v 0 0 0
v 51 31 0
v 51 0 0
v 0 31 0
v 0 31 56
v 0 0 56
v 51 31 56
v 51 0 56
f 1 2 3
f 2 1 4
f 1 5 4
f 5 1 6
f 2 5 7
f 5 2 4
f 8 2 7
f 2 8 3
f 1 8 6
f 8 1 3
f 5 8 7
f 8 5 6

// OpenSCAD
// pisa

x=50;
y=30;
z=55;

bleed=.5;
walls=4;
var=walls*.75;

module blokk(size, bleed) {
    x = size[0];
    y = size[1];
    
    for (z = [0:size[2]]) {
        translate([0,0,z])
            linear_extrude(1)
                square([x+bleed*2,y+bleed*2]);
                //square([size[0]+bleed*2,size[1]+bleed*2]);
    }
}

module ramme(size, walls, bleed) {
    translate([bleed,bleed]) {
        difference() {
            translate([-bleed,-bleed])
                square([size[0]+bleed*2,size[1]+bleed*2]);
            translate([walls,walls]) {
                square([size[0]-walls*2,size[1]-walls*2]);
            }
        }
    }
}
//polygon([[0,0], [x,0], [x,y], [0,y]]);

module test() {
    translate([0,-10])
        polygon([[1,1],[2,2],[3,4]]);
}

module skeiv(randlevel) {
    for (yy = [0:ysteps:y]) {
        echo(yy);
    }
}


//ramme(size=[x,y,z], walls=walls, bleed=bleed);
blokk(size=[x,y,z], bleed=bleed);
